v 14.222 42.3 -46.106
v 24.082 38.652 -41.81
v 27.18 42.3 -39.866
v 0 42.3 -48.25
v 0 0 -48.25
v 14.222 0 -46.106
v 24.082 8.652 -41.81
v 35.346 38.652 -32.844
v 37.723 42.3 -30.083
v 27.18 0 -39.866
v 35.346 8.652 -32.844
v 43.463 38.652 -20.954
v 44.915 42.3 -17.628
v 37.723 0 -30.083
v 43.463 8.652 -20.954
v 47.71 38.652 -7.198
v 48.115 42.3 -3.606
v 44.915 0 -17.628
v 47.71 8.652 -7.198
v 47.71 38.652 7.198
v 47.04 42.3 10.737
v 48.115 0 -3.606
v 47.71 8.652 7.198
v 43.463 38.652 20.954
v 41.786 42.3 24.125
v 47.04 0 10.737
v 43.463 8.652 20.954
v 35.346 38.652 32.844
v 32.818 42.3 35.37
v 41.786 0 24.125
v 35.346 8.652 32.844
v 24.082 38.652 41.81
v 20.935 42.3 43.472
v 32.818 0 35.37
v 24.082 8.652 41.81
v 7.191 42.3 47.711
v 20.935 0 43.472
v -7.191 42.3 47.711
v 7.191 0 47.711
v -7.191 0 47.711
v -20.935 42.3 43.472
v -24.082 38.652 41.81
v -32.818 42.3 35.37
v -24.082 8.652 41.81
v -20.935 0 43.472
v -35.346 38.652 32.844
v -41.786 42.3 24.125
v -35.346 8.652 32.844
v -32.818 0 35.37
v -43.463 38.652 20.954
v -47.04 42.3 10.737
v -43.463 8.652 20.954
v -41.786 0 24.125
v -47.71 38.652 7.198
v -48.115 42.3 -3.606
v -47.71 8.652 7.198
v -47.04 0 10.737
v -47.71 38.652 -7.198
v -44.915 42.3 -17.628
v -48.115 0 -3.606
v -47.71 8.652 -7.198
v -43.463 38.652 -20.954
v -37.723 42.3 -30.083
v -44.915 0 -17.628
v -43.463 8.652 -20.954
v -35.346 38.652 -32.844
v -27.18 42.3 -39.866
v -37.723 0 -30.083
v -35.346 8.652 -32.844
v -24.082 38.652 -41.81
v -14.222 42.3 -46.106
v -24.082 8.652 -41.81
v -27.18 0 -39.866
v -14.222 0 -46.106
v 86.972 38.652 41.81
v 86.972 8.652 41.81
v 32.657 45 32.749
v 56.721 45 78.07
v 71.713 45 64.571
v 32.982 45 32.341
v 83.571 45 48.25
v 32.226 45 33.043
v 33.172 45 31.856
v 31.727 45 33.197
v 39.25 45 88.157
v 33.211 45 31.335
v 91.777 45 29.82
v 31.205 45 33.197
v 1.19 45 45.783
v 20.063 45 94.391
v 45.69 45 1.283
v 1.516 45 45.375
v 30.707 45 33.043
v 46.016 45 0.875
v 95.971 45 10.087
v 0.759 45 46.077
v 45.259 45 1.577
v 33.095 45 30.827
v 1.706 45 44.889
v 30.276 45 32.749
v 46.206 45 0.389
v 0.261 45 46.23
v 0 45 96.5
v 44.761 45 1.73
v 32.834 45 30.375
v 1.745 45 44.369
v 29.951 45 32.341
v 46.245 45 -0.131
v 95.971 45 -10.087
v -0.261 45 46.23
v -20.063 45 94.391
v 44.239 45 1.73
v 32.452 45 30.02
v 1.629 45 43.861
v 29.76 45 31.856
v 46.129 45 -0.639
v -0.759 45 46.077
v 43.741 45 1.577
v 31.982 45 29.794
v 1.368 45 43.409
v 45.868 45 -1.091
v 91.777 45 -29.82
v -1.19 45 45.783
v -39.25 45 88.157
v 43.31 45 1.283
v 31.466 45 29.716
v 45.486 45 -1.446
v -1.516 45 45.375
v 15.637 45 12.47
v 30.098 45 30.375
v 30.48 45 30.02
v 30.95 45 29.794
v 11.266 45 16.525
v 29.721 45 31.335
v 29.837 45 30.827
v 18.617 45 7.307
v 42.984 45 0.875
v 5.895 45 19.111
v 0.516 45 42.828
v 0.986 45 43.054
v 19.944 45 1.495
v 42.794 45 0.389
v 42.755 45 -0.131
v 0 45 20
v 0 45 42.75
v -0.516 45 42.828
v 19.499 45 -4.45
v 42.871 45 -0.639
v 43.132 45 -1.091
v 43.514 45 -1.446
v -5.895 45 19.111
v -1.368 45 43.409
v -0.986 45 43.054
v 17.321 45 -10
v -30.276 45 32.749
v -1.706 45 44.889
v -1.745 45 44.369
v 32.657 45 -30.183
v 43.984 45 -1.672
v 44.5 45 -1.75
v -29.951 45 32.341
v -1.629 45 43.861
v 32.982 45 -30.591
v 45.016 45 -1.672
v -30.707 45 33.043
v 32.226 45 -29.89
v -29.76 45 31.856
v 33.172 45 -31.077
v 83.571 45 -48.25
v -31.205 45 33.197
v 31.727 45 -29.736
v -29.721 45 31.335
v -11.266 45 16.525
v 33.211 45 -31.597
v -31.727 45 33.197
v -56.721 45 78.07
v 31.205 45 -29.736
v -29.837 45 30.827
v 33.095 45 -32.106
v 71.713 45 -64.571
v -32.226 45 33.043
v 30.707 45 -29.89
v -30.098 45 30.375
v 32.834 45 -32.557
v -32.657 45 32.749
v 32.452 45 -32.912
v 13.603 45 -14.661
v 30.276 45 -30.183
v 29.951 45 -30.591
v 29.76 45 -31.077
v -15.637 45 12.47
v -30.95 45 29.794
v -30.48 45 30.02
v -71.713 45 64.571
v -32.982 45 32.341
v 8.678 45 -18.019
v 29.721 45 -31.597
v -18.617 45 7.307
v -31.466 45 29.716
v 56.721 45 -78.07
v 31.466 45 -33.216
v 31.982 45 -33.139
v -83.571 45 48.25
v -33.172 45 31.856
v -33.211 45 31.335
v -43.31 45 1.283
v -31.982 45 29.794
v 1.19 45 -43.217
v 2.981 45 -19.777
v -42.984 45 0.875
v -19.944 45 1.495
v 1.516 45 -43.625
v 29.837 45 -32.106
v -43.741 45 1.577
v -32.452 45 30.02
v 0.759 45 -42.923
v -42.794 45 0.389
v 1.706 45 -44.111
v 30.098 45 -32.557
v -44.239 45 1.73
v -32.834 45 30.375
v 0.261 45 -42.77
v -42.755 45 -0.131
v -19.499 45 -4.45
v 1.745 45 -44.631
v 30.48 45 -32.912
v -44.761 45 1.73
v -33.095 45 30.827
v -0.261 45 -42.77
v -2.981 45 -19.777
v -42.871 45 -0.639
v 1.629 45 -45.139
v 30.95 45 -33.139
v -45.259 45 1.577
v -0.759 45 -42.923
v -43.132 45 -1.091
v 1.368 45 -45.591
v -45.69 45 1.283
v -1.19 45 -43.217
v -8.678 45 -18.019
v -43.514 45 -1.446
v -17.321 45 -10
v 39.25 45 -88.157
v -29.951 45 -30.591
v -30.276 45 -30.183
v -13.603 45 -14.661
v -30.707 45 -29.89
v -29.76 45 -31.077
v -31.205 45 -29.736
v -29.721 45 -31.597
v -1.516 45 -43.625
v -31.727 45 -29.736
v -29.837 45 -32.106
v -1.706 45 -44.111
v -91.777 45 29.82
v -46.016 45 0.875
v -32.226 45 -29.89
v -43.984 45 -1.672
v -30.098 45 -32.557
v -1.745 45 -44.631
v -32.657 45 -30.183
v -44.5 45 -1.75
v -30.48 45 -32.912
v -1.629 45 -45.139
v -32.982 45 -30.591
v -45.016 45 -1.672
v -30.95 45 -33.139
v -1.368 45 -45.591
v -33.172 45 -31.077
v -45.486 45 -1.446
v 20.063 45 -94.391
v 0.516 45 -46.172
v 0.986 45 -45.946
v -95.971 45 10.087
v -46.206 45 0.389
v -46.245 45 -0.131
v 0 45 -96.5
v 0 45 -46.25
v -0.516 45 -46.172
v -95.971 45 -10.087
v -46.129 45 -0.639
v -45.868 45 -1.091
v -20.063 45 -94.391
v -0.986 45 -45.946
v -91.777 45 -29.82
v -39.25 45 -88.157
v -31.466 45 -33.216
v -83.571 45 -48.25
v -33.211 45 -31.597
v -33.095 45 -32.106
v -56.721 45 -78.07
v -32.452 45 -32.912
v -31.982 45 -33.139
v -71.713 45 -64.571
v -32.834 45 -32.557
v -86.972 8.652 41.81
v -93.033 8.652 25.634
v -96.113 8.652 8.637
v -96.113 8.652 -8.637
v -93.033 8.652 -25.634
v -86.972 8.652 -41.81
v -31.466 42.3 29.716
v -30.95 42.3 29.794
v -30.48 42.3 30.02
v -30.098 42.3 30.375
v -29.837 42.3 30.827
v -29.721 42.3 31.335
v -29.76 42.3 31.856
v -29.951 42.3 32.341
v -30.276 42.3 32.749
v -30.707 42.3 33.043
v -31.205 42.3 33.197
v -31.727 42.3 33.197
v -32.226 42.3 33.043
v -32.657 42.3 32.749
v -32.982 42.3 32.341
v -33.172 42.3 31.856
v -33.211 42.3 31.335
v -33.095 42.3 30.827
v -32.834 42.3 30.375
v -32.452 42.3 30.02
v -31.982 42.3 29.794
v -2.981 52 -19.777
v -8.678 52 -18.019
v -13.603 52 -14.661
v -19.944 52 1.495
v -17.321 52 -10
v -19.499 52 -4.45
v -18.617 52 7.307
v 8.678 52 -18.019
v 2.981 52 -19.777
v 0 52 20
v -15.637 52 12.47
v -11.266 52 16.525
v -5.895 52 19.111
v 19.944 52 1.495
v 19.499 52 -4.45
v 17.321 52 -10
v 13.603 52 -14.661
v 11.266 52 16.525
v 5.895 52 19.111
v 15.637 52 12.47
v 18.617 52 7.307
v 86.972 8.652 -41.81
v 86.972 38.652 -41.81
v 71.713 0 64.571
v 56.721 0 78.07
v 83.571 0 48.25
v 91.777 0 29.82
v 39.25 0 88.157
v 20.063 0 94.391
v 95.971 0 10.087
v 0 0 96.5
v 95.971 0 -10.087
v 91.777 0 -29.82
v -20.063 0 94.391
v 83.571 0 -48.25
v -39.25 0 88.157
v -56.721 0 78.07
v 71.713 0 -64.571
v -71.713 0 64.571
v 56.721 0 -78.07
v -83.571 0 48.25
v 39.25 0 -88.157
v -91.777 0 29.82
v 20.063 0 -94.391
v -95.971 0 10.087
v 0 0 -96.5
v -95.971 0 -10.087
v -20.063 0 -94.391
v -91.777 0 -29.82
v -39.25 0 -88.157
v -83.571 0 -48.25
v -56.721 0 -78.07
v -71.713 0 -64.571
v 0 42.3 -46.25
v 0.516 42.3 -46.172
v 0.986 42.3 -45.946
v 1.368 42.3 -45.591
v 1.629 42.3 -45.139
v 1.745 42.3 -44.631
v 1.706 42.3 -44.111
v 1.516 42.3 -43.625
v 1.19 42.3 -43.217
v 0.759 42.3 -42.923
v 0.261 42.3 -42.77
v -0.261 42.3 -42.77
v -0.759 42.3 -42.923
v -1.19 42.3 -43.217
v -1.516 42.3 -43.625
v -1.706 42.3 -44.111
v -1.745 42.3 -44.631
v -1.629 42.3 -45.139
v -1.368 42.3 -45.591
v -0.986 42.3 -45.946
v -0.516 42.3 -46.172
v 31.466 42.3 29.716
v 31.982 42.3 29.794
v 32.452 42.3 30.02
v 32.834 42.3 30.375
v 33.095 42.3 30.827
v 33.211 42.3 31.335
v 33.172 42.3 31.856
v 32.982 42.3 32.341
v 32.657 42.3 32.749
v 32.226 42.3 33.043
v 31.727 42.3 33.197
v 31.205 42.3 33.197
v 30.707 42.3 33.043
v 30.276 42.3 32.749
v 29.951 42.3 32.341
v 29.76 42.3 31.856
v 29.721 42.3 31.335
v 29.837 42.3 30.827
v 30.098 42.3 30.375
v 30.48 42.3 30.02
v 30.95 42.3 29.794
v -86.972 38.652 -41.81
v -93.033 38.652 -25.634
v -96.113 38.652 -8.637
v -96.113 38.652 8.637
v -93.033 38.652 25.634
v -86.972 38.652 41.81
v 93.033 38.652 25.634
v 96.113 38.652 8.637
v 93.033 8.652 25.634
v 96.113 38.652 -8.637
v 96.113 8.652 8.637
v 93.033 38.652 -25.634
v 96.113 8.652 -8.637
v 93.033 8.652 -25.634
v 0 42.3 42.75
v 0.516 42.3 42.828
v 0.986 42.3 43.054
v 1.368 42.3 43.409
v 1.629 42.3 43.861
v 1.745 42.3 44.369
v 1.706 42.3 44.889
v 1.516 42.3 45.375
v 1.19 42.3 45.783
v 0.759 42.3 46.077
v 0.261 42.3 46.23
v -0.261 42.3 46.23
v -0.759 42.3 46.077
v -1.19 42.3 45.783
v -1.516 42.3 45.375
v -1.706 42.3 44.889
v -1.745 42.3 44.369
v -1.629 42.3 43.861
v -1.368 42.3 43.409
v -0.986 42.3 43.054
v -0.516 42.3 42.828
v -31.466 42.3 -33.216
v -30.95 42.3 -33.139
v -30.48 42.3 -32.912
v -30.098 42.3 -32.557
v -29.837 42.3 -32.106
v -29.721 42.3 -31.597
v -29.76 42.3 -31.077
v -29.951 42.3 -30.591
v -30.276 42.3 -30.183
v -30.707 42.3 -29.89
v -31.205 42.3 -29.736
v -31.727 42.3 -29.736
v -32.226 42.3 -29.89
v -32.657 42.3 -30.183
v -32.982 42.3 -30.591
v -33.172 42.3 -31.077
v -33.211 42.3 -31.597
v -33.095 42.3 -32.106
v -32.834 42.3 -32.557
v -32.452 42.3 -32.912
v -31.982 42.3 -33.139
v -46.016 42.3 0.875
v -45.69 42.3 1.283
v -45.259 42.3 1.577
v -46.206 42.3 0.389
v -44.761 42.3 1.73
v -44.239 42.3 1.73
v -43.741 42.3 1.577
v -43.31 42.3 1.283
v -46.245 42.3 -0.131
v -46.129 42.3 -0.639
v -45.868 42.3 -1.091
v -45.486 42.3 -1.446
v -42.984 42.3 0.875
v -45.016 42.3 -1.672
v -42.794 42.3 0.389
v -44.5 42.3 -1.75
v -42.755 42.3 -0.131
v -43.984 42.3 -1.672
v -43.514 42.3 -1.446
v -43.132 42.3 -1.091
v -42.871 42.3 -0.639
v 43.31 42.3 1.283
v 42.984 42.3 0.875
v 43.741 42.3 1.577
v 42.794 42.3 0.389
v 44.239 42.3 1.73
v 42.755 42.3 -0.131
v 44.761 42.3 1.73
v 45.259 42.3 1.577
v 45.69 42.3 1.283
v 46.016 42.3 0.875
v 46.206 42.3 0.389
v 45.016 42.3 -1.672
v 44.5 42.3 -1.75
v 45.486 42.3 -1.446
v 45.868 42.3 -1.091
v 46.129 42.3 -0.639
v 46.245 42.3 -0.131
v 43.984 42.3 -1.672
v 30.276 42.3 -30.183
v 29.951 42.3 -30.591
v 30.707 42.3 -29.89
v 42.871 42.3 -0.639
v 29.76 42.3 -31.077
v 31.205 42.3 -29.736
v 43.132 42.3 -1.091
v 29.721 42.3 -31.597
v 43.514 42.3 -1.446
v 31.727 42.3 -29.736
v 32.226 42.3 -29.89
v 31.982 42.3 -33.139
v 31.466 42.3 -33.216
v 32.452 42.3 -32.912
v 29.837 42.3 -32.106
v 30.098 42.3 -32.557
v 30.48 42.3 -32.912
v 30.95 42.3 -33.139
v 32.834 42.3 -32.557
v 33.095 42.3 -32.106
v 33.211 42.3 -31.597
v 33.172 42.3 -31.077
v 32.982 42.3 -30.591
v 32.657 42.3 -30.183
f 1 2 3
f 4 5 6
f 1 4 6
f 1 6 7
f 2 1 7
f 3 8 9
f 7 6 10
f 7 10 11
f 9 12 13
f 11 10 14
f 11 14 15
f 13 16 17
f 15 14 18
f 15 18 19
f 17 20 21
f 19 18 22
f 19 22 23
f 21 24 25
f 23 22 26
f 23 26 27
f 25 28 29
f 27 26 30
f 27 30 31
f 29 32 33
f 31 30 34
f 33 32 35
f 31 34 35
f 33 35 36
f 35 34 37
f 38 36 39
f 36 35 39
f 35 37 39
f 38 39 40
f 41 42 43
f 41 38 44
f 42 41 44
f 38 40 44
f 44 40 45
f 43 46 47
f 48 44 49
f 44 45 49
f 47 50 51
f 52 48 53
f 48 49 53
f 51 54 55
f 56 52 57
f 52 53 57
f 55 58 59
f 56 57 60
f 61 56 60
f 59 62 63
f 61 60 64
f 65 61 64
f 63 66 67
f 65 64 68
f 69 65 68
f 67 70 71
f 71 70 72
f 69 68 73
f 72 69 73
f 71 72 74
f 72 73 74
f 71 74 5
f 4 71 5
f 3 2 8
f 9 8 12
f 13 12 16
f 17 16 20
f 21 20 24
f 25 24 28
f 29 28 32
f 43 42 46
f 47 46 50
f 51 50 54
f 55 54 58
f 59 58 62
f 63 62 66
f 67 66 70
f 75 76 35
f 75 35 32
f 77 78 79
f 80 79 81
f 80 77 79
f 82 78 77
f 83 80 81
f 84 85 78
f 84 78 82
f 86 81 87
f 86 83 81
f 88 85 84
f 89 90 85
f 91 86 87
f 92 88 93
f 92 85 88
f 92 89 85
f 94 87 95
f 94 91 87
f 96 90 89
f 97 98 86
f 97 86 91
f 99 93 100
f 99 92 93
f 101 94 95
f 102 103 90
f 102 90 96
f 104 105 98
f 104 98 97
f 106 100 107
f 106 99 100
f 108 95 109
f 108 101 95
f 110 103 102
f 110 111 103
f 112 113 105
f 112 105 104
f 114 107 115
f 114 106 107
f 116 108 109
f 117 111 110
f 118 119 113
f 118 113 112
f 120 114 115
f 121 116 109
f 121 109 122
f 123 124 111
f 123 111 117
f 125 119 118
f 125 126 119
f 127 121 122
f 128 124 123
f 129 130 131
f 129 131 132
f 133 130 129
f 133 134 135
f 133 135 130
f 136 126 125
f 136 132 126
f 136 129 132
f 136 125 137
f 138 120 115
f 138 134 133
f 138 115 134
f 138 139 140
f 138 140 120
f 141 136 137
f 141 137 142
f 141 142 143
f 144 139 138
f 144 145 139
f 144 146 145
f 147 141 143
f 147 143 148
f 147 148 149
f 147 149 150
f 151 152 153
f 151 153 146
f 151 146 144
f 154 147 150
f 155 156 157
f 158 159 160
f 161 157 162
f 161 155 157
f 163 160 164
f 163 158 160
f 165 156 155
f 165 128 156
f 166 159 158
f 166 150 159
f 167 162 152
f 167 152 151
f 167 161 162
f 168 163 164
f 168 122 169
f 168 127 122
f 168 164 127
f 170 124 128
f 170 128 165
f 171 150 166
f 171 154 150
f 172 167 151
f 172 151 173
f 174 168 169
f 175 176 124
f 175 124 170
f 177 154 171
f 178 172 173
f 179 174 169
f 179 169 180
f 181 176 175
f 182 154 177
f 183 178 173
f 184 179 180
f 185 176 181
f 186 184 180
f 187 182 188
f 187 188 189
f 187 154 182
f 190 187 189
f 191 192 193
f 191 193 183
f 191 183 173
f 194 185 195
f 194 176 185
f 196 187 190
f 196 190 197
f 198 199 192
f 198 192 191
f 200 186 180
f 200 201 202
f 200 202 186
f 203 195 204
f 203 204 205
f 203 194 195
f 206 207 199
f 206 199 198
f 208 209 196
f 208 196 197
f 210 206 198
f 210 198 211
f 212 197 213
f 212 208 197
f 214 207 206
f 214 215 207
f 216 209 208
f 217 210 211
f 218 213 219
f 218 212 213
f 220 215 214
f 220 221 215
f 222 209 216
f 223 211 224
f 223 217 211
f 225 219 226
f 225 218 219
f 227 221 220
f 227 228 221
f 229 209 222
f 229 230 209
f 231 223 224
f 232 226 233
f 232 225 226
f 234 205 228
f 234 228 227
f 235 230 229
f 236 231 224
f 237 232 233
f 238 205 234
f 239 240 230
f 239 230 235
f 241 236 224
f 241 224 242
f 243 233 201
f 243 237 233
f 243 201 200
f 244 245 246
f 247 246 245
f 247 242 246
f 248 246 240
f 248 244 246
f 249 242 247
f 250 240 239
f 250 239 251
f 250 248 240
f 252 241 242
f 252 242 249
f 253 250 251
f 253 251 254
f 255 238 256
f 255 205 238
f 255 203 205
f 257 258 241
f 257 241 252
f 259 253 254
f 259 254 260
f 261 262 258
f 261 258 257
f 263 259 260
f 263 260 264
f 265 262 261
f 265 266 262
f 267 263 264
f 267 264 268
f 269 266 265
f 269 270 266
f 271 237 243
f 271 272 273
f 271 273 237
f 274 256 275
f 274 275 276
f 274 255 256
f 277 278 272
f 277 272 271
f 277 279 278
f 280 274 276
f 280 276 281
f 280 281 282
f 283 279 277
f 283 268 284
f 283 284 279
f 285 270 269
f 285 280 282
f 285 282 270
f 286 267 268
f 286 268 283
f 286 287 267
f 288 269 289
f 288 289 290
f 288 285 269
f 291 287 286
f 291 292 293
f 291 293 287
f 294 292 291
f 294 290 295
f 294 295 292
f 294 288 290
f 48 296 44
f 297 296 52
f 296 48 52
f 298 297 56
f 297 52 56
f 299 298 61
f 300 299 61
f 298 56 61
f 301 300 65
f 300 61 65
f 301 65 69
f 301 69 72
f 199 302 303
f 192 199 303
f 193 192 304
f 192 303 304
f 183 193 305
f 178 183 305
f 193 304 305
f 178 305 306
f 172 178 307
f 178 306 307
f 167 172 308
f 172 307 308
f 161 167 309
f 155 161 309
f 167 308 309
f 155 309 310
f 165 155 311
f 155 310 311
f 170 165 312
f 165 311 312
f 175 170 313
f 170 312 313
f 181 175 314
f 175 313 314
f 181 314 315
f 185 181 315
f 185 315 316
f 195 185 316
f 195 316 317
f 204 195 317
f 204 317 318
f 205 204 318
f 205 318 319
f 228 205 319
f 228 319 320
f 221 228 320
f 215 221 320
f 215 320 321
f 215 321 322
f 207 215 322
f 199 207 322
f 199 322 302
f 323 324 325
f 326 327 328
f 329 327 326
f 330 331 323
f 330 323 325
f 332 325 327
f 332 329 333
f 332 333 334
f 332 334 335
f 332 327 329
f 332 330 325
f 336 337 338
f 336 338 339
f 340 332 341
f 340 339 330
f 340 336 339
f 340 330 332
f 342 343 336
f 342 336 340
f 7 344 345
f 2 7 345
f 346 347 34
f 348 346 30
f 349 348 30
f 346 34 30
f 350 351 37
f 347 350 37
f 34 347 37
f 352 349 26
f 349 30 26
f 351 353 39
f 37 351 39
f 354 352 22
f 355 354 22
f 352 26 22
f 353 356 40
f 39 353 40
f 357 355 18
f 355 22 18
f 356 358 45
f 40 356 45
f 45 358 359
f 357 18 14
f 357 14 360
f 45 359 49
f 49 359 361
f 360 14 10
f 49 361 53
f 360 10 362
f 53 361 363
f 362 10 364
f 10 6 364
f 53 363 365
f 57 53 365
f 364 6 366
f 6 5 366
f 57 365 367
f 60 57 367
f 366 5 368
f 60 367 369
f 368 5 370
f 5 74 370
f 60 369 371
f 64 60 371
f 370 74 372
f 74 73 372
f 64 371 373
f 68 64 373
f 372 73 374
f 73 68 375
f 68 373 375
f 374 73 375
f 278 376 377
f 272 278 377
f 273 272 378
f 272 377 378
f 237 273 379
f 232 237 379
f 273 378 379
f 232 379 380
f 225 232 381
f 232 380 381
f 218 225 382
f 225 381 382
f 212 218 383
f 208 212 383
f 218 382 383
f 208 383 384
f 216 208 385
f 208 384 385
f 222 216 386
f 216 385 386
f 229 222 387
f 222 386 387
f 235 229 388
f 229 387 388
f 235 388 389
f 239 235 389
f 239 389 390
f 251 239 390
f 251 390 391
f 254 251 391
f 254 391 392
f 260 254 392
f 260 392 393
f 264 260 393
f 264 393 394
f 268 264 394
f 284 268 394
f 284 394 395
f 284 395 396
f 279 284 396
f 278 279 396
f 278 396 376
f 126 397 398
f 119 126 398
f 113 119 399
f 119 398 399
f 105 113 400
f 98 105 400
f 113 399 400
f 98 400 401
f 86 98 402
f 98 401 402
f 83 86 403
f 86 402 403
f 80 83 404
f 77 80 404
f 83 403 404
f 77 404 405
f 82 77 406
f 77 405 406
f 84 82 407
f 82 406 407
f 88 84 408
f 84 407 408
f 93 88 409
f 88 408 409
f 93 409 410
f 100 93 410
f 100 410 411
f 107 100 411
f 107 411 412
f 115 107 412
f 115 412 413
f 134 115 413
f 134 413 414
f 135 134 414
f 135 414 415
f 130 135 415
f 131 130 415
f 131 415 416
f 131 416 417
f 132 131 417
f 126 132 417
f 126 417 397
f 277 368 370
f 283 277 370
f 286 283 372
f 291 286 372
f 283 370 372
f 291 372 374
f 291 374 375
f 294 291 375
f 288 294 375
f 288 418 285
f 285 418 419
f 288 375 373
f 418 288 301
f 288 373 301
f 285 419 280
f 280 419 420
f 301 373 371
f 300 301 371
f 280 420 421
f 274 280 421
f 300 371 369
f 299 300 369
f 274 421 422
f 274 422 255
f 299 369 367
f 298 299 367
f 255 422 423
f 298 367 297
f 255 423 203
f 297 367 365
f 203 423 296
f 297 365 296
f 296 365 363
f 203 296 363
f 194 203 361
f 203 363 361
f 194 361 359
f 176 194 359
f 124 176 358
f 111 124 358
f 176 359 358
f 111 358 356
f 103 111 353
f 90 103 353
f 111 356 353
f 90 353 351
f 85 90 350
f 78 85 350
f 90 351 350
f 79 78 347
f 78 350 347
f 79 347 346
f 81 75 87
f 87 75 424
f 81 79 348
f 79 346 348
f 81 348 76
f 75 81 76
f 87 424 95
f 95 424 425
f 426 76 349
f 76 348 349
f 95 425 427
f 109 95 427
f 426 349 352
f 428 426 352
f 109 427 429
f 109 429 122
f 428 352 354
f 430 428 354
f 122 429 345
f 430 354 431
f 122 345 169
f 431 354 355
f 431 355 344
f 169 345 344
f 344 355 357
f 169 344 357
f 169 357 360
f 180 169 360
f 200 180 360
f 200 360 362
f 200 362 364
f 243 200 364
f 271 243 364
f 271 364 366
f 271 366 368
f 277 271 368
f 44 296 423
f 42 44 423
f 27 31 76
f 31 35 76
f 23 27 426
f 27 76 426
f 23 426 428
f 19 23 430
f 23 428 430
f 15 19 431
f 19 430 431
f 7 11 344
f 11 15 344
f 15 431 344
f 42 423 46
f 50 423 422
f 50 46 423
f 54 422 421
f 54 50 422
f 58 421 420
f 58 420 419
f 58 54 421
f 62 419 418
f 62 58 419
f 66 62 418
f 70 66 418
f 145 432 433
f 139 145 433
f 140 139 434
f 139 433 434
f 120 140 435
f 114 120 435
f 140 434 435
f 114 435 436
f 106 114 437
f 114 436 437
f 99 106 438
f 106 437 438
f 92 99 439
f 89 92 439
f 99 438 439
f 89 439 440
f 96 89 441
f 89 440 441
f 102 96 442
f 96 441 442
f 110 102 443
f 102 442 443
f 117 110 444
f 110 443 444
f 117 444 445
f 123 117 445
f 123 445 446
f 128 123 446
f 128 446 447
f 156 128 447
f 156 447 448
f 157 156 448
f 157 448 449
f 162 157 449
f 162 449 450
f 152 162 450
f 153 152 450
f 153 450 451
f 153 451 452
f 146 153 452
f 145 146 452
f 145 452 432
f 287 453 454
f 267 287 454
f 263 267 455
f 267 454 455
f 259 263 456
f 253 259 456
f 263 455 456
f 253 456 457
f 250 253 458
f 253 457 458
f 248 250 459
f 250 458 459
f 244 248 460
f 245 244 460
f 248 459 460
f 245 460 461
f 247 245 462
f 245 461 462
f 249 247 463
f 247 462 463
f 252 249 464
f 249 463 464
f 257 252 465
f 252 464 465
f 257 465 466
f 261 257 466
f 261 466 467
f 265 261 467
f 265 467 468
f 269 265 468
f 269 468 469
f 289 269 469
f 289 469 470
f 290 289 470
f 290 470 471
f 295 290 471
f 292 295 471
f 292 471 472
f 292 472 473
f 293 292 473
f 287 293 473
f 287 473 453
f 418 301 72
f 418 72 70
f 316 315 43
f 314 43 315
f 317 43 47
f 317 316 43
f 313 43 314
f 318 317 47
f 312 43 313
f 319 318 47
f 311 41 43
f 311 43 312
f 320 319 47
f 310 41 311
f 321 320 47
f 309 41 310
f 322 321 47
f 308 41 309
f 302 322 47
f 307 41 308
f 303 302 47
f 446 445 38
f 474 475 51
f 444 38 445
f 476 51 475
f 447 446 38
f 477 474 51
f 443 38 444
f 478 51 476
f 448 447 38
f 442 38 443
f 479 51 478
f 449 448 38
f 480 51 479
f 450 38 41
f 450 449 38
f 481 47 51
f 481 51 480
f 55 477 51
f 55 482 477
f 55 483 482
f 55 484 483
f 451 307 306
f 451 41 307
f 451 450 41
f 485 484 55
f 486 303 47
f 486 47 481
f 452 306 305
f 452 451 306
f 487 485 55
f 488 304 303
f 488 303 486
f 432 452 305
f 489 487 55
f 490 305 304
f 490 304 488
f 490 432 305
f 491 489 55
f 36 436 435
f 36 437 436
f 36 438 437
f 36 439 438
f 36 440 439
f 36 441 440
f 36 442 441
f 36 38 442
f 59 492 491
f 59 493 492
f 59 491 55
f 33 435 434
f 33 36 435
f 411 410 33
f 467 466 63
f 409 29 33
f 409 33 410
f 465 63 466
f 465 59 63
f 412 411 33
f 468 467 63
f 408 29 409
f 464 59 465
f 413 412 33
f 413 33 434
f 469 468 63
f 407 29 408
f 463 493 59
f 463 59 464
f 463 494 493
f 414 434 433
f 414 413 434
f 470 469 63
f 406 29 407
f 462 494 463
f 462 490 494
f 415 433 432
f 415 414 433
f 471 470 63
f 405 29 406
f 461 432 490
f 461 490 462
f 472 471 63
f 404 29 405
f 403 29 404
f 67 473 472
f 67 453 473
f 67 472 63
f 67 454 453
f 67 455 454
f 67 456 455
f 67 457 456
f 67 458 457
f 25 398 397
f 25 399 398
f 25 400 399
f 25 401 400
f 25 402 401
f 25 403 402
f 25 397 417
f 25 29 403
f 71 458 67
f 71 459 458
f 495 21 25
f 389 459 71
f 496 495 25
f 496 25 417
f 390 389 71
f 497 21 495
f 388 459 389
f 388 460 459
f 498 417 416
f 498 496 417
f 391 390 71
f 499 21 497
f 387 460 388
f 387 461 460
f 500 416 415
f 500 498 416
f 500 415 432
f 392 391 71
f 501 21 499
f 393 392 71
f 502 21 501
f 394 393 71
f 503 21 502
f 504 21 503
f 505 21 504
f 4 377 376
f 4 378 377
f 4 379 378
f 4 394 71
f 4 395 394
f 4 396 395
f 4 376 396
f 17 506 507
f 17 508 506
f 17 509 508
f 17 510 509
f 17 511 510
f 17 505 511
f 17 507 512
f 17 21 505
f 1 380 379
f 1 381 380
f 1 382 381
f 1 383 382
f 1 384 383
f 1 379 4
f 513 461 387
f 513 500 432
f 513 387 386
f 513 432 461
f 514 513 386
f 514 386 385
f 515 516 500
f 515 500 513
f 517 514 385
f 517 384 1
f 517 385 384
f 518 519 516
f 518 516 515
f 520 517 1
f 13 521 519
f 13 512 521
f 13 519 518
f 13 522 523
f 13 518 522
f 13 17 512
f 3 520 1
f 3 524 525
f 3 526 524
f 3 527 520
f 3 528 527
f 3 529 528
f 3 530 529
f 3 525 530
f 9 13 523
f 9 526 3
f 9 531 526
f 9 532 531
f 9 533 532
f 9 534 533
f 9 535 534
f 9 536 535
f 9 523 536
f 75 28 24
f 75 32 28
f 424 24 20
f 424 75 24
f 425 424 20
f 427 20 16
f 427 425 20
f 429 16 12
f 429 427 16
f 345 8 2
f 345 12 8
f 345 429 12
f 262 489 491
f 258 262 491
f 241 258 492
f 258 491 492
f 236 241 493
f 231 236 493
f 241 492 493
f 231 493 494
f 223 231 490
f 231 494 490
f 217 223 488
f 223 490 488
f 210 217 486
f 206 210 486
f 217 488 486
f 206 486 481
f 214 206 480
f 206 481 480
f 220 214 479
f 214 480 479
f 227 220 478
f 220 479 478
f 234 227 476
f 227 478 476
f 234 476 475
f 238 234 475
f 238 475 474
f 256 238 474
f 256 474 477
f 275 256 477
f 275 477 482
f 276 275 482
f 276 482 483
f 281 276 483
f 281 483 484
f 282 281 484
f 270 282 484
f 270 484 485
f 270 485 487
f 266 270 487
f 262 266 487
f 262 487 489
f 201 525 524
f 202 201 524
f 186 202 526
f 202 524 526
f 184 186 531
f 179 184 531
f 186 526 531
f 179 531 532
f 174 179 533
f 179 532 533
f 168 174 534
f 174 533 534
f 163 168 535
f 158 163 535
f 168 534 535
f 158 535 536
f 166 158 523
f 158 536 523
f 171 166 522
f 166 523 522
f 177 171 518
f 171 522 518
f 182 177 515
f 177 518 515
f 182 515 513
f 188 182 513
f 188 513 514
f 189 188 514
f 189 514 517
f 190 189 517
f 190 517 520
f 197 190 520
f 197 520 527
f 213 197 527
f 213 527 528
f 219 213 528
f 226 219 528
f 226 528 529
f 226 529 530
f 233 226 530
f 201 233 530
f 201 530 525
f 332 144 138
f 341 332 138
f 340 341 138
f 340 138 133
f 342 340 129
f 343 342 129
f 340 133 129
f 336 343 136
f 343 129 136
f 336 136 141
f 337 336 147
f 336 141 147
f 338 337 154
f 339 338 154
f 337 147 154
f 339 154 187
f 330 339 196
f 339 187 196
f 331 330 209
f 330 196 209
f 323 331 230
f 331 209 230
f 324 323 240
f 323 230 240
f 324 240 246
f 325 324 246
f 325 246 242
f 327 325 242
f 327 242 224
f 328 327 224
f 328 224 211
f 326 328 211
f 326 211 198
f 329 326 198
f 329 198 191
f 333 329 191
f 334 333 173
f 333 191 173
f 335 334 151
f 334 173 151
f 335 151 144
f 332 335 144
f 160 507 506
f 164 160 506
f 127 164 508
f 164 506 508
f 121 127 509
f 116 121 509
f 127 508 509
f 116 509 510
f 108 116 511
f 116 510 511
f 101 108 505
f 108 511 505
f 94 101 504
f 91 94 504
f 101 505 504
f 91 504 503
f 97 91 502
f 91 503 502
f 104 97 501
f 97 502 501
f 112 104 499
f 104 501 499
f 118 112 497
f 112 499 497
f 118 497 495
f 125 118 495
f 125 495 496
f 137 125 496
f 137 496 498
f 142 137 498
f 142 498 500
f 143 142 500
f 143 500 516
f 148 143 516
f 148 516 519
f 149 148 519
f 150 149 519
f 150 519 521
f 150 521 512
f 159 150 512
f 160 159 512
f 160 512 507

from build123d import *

# Parameters (mm, degrees)
SKETCH_1_R          = 96.5
EXTRUDE_1_DEPTH     = 45
SKETCH_2_R          = 48.25
CUT_EXTRUDE_1_DEPTH = 42.3
SKETCH_3_W          = 83.620488478
SKETCH_3_H          = 30
CUT_EXTRUDE_2_DEPTH = 500
SKETCH_5_R          = 20
EXTRUDE_2_DEPTH     = 7
SKETCH_8_R          = 1.75
CUT_EXTRUDE_3_DEPTH = 143.876835071


with BuildPart() as part:
    # 草图1 → 凸台-拉伸1 (new body)
    with BuildSketch(Plane(origin=(0, 0, 0), x_dir=(1, 0, 0), z_dir=(0, 1, 0))):
        with Locations(Location((0, 0, 0), (0, 0, 90))):
            Circle(SKETCH_1_R)
    extrude(amount=EXTRUDE_1_DEPTH)

    # 草图2 → 切除-拉伸1 (cut)
    with BuildSketch(Plane(origin=(0, 0, 0), x_dir=(-1, 0, 0), z_dir=(0, -1, 0))):
        with Locations(Location((0, 0, 0), (0, 0, 90))):
            Circle(SKETCH_2_R)
    extrude(amount=-CUT_EXTRUDE_1_DEPTH, mode=Mode.SUBTRACT)

    # 草图3 → 切除-拉伸2 (cut, symmetric)
    with BuildSketch(Plane(origin=(0, 0, 0), x_dir=(0, 0, -1), z_dir=(1, 0, 0))):
        with Locations((0, 23.651984039)):
            Rectangle(SKETCH_3_W, SKETCH_3_H)
    extrude(amount=CUT_EXTRUDE_2_DEPTH, both=True, mode=Mode.SUBTRACT)

    # 草图5 → 凸台-拉伸2 (add)
    with BuildSketch(Plane(origin=(0, 45, 0), x_dir=(1, 0, 0), z_dir=(0, 1, 0))):
        with Locations(Location((0, 0, 0), (0, 0, 270))):
            Circle(SKETCH_5_R)
    extrude(amount=EXTRUDE_2_DEPTH)

    # 草图8 → 切除-拉伸3 (cut, through all)
    with BuildSketch(Plane(origin=(0, 42.3, 0), x_dir=(-1, 0, 0), z_dir=(0, -1, 0))):
        with Locations(Location((0, -44.5, 0), (0, 0, 90))):
            Circle(SKETCH_8_R)
        with Locations(Location((-31.466251763, -31.466251763, 0), (0, 0, 90))):
            Circle(SKETCH_8_R)
        with Locations(Location((-44.5, 0, 0), (0, 0, 90))):
            Circle(SKETCH_8_R)
        with Locations(Location((-31.466251763, 31.466251763, 0), (0, 0, 90))):
            Circle(SKETCH_8_R)
        with Locations(Location((0, 44.5, 0), (0, 0, 90))):
            Circle(SKETCH_8_R)
        with Locations(Location((31.466251763, 31.466251763, 0), (0, 0, 90))):
            Circle(SKETCH_8_R)
        with Locations(Location((44.5, 0, 0), (0, 0, 90))):
            Circle(SKETCH_8_R)
        with Locations(Location((31.466251763, -31.466251763, 0), (0, 0, 90))):
            Circle(SKETCH_8_R)
    extrude(amount=-CUT_EXTRUDE_3_DEPTH, mode=Mode.SUBTRACT)


solid = part.part
